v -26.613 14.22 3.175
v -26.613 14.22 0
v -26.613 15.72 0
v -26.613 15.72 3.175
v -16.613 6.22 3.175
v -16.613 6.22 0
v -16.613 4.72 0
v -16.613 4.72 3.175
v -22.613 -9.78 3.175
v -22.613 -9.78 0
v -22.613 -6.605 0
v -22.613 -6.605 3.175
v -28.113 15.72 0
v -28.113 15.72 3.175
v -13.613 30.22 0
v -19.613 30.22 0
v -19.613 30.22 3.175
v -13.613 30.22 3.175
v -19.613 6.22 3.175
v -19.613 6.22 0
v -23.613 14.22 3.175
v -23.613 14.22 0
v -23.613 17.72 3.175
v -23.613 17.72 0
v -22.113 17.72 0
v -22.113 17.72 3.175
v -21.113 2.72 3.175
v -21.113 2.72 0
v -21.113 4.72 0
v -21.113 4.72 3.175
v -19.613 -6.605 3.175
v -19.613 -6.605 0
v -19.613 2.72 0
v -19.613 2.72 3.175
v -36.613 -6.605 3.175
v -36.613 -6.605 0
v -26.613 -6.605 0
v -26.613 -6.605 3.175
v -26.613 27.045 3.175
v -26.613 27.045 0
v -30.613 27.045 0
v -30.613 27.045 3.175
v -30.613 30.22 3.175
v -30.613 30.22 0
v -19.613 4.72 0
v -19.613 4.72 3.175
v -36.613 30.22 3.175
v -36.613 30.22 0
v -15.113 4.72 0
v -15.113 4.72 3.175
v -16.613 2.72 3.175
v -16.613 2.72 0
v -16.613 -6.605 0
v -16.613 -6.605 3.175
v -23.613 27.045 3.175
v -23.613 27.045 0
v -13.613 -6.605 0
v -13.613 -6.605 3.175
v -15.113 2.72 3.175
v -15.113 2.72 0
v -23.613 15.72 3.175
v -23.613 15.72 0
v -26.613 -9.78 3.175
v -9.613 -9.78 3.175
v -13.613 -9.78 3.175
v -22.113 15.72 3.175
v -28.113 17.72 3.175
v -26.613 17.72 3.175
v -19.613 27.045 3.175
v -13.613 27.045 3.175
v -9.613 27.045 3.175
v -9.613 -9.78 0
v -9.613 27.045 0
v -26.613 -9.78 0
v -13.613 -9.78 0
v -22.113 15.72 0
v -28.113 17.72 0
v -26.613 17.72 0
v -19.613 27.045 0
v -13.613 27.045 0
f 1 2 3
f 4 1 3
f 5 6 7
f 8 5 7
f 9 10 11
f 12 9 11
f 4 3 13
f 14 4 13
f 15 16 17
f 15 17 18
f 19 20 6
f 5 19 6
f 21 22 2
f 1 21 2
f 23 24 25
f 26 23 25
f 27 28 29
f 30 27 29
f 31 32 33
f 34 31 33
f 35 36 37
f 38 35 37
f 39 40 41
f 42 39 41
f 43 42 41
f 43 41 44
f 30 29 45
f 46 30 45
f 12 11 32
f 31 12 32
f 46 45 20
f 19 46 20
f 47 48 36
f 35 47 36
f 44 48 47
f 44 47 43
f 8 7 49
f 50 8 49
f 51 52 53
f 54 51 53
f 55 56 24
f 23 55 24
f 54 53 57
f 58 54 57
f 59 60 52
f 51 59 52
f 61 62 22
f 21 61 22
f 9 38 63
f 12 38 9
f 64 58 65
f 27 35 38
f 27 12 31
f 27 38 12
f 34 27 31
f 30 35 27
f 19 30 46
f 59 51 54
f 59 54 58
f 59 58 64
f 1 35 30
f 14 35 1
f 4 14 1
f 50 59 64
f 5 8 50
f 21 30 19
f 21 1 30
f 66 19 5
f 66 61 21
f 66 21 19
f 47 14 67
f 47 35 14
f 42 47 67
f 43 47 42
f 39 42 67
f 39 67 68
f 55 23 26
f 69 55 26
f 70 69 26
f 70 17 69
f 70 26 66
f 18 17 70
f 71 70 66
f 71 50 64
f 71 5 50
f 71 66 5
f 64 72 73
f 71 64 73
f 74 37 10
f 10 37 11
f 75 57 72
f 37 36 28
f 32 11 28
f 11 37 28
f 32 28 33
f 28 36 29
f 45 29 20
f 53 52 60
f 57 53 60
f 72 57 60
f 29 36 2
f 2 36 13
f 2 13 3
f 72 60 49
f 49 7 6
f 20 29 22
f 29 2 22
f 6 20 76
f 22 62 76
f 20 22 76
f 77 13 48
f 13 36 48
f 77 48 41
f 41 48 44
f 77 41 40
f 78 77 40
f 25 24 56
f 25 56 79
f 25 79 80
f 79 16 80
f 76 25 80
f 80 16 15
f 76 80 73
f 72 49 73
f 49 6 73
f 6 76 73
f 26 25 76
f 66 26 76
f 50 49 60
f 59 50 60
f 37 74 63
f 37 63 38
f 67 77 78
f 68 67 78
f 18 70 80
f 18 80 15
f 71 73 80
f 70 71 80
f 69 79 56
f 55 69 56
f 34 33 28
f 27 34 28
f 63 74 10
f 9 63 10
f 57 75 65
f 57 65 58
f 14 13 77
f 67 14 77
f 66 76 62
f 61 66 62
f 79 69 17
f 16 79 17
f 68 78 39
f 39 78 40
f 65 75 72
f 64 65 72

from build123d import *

# Parameters (mm, degrees)
F0_W     = 6
F0_H     = 3.175
F0_W_2   = 4
F1_DEPTH = 3.175


# Not quite as in the source:
# - a length typed as a fraction of an inch, garbled in the dataset ("3 / 203.2 mm" for 3/8 in), is restored


with BuildPart() as f1:
    # F0 (on Top) → F1 (new body)
    with BuildSketch(Plane.XY):
        Polygon((-26.613304615, 17.7200174183), (-26.613304615, 27.0450174183), (-30.613304615, 27.0450174183), (-36.613304615, 27.0450174183), (-36.613304615, -6.6049825817), (-26.613304615, -6.6049825817), (-22.613304615, -6.6049825817), (-19.613304615, -6.6049825817), (-19.613304615, 2.7200174183), (-21.113304615, 2.7200174183), (-21.113304615, 4.7200174183), (-19.613304615, 4.7200174183), (-19.613304615, 6.2200174183), (-16.613304615, 6.2200174183), (-16.613304615, 4.7200174183), (-15.113304615, 4.7200174183), (-15.113304615, 2.7200174183), (-16.613304615, 2.7200174183), (-16.613304615, -6.6049825817), (-13.613304615, -6.6049825817), (-9.613304615, -6.6049825817), (-9.613304615, 27.0450174183), (-13.613304615, 27.0450174183), (-19.613304615, 27.0450174183), (-23.613304615, 27.0450174183), (-23.613304615, 17.7200174183), (-22.113304615, 17.7200174183), (-22.113304615, 15.7200174183), (-23.613304615, 15.7200174183), (-23.613304615, 14.2200174183), (-26.613304615, 14.2200174183), (-26.613304615, 15.7200174183), (-28.113304615, 15.7200174183), (-28.113304615, 17.7200174183), align=None)
        with Locations((-33.613304615, 28.6325174183)):
            Rectangle(F0_W, F0_H)
        with Locations((-16.613304615, 28.6325174183)):
            Rectangle(F0_W, F0_H)
        with Locations((-24.613304615, -8.1924825817)):
            Rectangle(F0_W_2, F0_H)
        with Locations((-11.613304615, -8.1924825817)):
            Rectangle(F0_W_2, F0_H)
    extrude(amount=F1_DEPTH)


solid = f1.part
